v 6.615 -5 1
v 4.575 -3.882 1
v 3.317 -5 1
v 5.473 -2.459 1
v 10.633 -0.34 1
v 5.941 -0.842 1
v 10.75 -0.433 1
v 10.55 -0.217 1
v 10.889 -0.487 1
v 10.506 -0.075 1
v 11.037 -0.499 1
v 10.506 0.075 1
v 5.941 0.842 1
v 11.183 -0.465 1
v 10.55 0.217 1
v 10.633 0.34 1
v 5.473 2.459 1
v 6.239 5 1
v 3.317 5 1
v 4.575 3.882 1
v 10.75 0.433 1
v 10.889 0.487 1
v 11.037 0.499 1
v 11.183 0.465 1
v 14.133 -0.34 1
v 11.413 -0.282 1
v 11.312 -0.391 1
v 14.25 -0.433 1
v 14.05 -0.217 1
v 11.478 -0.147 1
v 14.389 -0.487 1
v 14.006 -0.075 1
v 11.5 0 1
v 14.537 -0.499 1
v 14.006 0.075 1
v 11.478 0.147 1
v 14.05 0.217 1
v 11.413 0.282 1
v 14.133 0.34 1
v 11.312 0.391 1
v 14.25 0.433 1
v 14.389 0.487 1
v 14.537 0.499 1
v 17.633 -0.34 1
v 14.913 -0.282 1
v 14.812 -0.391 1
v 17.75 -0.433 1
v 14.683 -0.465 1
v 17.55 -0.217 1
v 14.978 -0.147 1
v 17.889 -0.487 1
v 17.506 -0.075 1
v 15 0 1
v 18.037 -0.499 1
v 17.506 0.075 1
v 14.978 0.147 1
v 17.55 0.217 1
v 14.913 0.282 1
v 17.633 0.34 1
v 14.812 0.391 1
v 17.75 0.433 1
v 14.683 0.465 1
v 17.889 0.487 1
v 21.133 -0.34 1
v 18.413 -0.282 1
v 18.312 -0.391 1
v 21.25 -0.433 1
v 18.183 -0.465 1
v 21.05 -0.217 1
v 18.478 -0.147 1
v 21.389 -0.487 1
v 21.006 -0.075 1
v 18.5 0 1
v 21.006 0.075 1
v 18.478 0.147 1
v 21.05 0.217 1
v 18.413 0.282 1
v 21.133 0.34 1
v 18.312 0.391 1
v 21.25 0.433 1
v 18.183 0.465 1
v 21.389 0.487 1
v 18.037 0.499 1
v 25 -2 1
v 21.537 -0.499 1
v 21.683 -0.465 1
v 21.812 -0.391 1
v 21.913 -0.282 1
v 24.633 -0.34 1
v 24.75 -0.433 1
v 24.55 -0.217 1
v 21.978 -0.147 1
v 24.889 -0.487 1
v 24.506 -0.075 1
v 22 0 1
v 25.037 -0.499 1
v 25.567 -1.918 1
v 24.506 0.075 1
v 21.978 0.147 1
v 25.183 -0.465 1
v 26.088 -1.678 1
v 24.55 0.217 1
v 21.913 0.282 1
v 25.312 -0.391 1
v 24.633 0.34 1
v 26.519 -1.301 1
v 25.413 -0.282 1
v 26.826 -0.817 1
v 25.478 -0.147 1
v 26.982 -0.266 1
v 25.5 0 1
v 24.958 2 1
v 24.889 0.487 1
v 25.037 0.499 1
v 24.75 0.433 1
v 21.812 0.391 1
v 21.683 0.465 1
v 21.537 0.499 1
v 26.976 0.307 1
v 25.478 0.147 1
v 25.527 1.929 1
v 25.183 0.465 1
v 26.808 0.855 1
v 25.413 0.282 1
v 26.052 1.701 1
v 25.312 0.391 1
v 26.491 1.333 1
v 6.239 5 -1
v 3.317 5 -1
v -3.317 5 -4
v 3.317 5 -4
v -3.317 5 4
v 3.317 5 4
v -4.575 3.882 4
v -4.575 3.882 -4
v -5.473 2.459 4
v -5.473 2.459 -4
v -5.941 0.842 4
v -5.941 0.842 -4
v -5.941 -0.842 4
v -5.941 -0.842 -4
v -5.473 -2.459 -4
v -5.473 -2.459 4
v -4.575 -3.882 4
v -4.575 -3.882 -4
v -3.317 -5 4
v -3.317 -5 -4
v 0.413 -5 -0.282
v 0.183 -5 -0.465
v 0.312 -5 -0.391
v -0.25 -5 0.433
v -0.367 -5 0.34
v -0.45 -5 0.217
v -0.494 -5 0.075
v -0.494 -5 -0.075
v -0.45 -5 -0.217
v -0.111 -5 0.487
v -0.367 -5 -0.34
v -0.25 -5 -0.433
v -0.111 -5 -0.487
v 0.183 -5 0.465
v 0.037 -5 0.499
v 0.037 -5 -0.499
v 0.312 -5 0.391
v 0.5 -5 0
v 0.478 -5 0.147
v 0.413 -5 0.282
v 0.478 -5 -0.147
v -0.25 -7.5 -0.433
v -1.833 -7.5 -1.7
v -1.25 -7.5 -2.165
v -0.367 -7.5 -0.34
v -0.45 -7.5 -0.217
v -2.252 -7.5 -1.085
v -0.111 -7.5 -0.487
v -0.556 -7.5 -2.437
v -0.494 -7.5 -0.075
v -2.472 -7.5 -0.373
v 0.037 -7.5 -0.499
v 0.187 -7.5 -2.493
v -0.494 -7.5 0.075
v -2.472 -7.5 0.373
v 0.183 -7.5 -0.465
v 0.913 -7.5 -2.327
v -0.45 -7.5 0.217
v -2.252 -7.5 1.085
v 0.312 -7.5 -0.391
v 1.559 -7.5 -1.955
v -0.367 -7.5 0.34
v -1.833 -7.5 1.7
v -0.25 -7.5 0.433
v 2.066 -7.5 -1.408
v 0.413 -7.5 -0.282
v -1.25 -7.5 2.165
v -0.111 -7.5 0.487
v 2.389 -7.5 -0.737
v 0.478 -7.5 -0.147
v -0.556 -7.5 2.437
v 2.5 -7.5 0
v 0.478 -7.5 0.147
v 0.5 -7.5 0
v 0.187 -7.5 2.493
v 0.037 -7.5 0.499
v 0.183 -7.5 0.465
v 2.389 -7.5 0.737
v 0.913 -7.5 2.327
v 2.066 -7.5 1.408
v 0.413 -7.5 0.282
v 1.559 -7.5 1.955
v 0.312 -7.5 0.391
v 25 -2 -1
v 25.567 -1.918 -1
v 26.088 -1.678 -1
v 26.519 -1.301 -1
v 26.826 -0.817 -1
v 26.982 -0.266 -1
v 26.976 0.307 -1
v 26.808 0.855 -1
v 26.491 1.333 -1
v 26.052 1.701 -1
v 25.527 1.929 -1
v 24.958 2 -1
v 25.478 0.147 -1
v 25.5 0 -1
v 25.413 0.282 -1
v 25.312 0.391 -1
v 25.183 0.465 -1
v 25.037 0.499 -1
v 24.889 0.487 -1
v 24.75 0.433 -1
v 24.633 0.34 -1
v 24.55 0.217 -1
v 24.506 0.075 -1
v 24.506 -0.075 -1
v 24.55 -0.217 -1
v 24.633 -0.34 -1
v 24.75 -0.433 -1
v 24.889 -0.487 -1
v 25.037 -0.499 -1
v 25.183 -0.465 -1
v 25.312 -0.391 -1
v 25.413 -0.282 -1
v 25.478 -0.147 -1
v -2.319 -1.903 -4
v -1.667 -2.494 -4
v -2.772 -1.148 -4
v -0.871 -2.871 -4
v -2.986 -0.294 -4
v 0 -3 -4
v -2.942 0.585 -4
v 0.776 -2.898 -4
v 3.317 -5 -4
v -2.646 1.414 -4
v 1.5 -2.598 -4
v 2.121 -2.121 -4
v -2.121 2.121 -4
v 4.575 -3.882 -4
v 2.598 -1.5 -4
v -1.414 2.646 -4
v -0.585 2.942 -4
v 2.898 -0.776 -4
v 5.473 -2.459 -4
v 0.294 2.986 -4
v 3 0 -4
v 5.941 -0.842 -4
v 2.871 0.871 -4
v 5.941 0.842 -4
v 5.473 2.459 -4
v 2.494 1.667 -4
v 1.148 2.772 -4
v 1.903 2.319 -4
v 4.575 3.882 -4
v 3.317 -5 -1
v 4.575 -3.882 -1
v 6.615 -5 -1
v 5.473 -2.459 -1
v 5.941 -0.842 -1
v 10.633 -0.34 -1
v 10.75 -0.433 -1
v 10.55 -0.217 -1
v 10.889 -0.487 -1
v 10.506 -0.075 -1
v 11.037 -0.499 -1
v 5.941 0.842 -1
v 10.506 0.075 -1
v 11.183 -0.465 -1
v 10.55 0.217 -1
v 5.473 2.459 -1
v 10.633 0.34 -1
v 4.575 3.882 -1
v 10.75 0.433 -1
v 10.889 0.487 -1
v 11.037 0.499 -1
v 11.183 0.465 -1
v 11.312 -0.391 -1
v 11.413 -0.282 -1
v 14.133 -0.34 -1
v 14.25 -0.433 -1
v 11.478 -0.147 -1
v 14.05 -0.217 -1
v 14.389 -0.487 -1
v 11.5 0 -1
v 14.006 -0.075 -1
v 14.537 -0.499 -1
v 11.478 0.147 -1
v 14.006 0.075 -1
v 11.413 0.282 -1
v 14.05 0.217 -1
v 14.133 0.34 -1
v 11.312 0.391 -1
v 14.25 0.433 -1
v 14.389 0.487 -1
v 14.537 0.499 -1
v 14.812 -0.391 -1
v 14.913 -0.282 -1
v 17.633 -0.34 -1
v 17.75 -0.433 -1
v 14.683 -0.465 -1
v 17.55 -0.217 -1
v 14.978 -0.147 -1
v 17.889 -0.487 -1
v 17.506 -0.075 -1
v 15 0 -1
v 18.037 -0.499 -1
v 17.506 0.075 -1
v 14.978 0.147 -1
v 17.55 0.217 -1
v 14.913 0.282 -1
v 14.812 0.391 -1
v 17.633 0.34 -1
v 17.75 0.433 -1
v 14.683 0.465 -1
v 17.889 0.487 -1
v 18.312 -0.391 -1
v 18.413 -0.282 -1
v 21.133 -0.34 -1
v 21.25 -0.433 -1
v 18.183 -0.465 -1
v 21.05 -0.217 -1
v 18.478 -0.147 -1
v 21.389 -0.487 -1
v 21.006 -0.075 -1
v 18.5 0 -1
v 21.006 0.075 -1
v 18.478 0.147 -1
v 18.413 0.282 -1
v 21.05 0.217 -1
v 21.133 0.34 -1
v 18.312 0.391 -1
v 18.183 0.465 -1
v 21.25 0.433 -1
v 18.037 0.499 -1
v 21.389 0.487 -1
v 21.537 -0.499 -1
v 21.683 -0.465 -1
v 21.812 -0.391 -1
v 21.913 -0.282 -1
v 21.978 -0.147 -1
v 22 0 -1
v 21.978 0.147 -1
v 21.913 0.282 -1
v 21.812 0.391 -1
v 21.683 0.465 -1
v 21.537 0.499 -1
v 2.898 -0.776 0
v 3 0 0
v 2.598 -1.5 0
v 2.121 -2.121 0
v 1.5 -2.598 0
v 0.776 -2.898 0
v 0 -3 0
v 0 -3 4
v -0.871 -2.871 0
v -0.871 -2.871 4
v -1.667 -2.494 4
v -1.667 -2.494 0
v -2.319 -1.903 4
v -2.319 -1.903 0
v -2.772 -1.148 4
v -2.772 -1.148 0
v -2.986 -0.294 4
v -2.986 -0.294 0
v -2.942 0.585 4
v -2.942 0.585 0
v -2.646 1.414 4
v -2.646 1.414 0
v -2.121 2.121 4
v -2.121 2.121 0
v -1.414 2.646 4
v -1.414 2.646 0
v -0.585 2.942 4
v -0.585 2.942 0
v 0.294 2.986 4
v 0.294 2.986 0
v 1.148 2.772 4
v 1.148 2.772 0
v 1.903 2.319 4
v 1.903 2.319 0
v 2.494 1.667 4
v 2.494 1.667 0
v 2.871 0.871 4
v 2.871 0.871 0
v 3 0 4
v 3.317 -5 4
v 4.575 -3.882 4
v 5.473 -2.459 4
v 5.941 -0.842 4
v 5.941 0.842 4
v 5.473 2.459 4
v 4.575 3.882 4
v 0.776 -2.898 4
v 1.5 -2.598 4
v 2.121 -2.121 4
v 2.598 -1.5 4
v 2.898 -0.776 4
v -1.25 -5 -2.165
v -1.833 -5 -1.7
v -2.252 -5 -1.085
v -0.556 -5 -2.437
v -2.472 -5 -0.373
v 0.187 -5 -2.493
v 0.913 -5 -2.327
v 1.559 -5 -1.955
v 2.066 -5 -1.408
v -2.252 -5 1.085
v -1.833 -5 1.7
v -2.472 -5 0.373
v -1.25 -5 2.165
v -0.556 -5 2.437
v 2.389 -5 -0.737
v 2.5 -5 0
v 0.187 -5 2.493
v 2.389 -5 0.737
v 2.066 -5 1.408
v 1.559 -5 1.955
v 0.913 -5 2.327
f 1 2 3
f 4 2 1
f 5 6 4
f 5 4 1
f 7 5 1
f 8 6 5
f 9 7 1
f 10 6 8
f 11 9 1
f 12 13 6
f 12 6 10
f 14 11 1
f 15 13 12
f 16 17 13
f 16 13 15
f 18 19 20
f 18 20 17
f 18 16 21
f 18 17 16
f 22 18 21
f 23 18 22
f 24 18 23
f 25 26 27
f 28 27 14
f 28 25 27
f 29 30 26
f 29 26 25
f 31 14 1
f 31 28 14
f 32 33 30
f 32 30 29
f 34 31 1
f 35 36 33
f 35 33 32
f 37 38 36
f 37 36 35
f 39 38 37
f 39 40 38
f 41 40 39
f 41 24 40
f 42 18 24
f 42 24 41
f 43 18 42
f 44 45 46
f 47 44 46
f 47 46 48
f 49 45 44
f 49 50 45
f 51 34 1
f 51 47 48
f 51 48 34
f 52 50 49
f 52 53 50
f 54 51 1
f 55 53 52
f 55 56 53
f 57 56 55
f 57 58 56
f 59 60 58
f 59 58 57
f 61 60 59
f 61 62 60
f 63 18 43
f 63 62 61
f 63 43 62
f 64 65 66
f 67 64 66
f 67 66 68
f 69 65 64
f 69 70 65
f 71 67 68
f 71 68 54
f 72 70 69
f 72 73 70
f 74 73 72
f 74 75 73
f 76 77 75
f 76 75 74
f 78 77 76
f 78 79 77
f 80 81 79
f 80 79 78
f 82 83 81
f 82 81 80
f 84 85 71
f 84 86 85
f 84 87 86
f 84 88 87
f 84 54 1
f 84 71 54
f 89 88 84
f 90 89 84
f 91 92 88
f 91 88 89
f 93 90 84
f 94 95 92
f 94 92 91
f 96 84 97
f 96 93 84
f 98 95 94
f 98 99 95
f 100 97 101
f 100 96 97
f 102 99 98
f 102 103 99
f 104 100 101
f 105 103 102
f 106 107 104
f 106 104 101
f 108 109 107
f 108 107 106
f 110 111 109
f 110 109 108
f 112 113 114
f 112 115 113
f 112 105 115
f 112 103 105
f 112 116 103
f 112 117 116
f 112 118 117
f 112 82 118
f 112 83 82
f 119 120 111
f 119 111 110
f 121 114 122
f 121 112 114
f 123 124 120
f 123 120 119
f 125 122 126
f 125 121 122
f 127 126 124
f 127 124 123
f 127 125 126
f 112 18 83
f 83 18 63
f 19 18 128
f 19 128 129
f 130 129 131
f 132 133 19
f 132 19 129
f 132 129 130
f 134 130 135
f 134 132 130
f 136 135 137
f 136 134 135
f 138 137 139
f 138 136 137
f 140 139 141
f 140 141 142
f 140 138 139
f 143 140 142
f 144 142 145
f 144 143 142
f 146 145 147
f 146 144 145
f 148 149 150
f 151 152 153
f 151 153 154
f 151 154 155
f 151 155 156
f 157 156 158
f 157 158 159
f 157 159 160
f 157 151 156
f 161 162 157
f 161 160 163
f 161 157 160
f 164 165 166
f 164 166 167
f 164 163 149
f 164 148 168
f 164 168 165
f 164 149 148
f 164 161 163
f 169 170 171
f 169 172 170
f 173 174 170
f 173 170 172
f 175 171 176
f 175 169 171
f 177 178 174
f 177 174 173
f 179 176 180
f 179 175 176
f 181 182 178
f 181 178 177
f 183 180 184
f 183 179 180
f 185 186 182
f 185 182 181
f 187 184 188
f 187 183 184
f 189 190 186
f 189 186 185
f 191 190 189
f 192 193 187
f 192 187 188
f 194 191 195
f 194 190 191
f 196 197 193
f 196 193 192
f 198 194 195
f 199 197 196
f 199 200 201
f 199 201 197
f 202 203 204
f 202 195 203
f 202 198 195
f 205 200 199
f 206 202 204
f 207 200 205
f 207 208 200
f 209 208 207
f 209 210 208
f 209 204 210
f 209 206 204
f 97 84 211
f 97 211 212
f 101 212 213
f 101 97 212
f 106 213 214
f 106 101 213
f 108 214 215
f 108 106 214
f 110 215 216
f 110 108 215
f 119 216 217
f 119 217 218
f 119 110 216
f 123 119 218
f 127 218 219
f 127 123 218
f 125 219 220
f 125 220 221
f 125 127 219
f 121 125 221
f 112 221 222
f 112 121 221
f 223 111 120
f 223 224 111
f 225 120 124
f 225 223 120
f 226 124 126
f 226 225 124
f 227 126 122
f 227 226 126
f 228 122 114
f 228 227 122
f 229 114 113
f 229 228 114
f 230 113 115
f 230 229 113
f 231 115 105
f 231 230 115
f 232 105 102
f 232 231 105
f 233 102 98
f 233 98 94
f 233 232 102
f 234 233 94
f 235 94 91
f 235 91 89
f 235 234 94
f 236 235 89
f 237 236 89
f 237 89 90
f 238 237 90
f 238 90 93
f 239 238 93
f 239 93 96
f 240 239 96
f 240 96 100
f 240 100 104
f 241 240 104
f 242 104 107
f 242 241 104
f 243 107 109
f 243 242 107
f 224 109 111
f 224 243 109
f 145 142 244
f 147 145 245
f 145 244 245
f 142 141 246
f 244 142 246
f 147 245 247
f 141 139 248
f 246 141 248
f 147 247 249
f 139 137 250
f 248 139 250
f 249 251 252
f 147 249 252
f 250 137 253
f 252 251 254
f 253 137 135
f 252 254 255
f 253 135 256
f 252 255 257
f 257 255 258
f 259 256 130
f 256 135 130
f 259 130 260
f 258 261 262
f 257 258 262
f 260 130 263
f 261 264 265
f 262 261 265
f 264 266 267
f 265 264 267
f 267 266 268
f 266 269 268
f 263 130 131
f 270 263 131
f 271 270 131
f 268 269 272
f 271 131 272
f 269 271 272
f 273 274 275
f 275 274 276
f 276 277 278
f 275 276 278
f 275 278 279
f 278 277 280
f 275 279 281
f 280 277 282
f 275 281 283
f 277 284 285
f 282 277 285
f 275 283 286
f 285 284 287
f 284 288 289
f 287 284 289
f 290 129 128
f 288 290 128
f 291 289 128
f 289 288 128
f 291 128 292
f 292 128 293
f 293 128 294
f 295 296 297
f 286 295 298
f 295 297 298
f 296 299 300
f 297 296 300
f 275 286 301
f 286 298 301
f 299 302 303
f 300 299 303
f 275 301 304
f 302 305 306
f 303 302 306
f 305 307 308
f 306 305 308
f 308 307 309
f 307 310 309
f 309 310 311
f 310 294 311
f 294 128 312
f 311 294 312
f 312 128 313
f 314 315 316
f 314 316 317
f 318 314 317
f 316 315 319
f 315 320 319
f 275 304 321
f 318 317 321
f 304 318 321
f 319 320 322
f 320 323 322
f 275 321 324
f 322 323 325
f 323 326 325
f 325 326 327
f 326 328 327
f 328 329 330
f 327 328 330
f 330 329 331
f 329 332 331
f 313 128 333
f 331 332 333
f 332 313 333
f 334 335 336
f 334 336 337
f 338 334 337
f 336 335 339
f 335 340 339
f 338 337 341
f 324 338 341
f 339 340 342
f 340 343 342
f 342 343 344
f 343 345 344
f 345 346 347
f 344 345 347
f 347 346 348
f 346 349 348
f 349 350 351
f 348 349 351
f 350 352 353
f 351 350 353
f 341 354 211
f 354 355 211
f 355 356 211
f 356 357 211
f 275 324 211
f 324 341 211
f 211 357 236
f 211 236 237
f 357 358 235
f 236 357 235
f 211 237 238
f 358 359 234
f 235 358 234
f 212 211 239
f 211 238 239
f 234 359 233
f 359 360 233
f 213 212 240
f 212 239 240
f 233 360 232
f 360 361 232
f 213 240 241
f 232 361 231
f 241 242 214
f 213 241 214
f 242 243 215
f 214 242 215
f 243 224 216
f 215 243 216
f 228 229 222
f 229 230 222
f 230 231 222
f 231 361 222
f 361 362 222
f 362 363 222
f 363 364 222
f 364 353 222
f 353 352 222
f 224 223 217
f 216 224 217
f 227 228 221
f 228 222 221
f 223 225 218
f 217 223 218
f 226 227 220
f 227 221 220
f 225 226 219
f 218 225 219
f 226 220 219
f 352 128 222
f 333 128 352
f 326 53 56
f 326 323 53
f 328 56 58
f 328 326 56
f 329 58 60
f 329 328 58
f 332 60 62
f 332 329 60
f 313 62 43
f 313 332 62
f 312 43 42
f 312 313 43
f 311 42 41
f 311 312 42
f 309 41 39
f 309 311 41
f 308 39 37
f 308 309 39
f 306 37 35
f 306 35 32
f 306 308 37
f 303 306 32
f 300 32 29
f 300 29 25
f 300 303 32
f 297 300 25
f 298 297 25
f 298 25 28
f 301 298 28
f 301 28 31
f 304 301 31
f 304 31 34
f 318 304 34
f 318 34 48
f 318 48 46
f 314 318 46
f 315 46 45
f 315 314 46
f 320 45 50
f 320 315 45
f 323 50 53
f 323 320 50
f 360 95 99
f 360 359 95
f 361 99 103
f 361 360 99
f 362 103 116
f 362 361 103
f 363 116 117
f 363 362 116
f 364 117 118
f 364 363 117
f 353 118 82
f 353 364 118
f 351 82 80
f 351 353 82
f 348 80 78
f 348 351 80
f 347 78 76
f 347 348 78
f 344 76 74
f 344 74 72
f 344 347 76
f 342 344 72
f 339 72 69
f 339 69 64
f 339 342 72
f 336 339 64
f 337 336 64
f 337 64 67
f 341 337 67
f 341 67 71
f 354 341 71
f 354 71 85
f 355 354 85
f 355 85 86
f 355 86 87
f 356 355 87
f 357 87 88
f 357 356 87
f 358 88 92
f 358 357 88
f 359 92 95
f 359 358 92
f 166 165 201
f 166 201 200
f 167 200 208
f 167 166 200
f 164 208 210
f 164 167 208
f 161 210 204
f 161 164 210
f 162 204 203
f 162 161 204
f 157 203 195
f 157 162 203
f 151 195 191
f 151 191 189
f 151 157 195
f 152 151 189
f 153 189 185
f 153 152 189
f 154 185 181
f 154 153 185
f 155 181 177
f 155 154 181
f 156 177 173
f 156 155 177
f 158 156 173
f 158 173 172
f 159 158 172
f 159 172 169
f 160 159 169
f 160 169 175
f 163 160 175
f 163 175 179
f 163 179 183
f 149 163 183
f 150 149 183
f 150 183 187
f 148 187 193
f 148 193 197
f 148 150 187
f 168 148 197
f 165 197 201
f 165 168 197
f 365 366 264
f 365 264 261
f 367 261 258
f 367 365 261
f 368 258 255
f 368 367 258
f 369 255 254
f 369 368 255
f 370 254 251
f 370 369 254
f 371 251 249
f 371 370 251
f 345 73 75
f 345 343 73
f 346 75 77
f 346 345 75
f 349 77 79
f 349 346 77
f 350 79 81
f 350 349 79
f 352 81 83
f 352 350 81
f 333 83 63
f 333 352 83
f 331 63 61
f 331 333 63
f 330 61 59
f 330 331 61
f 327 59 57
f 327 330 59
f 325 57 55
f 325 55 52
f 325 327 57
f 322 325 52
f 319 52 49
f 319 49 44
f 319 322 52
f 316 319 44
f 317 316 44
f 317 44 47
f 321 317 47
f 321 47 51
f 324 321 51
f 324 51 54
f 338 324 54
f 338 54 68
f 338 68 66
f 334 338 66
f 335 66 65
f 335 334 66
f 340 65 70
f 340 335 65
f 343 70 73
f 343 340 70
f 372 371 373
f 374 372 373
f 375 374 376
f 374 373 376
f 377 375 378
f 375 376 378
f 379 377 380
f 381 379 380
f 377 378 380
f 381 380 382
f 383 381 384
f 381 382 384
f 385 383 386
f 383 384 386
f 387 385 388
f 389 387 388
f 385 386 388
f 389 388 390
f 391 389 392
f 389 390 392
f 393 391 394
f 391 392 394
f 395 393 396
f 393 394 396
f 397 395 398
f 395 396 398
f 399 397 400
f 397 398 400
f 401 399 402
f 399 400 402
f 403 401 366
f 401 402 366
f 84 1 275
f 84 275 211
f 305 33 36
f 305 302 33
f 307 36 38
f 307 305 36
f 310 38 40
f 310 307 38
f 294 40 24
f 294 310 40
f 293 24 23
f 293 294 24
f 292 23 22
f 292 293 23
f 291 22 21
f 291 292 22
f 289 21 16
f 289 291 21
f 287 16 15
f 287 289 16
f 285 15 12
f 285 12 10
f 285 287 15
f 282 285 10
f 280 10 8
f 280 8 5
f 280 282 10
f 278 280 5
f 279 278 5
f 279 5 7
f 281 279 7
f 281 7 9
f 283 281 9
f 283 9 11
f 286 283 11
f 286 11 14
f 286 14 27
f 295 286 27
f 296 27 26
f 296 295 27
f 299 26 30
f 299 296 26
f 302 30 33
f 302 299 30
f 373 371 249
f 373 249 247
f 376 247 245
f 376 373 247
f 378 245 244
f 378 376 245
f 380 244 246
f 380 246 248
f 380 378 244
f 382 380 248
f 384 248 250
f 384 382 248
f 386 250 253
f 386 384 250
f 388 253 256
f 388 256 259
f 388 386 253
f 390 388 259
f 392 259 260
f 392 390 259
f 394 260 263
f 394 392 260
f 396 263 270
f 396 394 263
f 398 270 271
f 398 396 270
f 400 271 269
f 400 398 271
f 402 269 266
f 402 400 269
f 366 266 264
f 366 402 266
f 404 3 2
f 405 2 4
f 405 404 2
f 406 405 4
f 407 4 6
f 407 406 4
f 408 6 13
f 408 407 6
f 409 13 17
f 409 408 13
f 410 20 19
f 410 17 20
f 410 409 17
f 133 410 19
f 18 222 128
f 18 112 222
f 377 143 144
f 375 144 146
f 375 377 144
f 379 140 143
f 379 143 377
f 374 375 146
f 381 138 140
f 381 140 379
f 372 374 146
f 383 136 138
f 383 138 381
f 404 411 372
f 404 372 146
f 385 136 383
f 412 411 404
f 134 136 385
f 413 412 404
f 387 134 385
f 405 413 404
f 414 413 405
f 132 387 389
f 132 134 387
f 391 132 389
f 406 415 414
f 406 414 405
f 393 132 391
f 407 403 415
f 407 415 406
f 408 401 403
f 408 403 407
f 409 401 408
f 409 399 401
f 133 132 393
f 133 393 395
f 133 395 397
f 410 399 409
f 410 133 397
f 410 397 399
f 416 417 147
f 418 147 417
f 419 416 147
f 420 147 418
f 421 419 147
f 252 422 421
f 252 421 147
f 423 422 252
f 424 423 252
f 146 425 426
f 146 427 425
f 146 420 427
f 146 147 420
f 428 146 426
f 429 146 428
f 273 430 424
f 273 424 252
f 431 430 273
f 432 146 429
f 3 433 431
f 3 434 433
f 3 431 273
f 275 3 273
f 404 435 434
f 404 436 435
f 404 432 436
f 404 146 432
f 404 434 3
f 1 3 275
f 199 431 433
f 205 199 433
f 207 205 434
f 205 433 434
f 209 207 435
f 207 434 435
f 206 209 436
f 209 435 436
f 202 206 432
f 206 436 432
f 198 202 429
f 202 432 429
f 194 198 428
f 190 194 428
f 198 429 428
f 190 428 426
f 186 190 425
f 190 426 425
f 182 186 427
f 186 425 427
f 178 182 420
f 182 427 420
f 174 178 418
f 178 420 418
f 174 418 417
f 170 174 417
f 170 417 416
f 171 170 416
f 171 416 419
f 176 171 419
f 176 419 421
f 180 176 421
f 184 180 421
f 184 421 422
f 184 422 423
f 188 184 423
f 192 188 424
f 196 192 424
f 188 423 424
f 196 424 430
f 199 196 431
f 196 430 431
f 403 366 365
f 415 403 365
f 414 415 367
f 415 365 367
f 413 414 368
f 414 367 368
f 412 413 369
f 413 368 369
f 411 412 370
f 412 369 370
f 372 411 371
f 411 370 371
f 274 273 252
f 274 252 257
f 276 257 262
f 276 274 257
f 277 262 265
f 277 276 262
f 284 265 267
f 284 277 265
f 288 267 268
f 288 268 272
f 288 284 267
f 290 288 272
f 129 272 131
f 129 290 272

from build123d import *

# Parameters (mm, degrees)
F1_DEPTH = 4
F0_R     = 0.5
F2_DEPTH = 1
F3_R     = 2.5
F3_R_2   = 0.5
F4_DEPTH = 2.5


with BuildPart() as f1:
    # F0 (on Top) → F1 (new body, symmetric)
    with BuildSketch(Plane.XY):
        with BuildLine():
            Line((-3.3166247904, -5), (0, -5))
            Line((0, -5), (3.3166247904, -5))
            ThreePointArc((3.3166247904, -5), (6, 0), (3.3166247904, 5))
            Line((3.3166247904, 5), (-3.3166247904, 5))
            ThreePointArc((-3.3166247904, 5), (-6, 0), (-3.3166247904, -5))
        make_face()
        with BuildLine():
            ThreePointArc((0, -3), (-2.1213203436, 2.1213203436), (3, 0))
            ThreePointArc((3, 0), (2.1213203436, -2.1213203436), (0, -3))
        make_face(mode=Mode.SUBTRACT)
    extrude(amount=F1_DEPTH, both=True)

    # F0 (on Top) → F2 (join, symmetric)
    with BuildSketch(Plane.XY):
        with BuildLine():
            ThreePointArc((3.3166247904, 5), (6, 0), (3.3166247904, -5))
            Line((3.3166247904, -5), (6.6147298804, -5))
            Line((6.6147298804, -5), (25, -2))
            ThreePointArc((25, -2), (26.9998884615, 0.0211220617), (24.9577582326, 1.9995538585))
            Line((24.9577582326, 1.9995538585), (6.2387437176, 5))
            Line((6.2387437176, 5), (3.3166247904, 5))
        make_face()
        with Locations((11, 0)):
            Circle(F0_R, mode=Mode.SUBTRACT)
        with Locations((14.5, 0)):
            Circle(F0_R, mode=Mode.SUBTRACT)
        with Locations((18, 0)):
            Circle(F0_R, mode=Mode.SUBTRACT)
        with Locations((21.5, 0)):
            Circle(F0_R, mode=Mode.SUBTRACT)
        with Locations((25, 0)):
            Circle(F0_R, mode=Mode.SUBTRACT)
    extrude(amount=F2_DEPTH, both=True)

    # F3 (on face) → F4 (join)
    with BuildSketch(Plane.XZ.offset(5)):
        Circle(F3_R)
        Circle(F3_R_2, mode=Mode.SUBTRACT)
    extrude(amount=F4_DEPTH)


solid = f1.part
